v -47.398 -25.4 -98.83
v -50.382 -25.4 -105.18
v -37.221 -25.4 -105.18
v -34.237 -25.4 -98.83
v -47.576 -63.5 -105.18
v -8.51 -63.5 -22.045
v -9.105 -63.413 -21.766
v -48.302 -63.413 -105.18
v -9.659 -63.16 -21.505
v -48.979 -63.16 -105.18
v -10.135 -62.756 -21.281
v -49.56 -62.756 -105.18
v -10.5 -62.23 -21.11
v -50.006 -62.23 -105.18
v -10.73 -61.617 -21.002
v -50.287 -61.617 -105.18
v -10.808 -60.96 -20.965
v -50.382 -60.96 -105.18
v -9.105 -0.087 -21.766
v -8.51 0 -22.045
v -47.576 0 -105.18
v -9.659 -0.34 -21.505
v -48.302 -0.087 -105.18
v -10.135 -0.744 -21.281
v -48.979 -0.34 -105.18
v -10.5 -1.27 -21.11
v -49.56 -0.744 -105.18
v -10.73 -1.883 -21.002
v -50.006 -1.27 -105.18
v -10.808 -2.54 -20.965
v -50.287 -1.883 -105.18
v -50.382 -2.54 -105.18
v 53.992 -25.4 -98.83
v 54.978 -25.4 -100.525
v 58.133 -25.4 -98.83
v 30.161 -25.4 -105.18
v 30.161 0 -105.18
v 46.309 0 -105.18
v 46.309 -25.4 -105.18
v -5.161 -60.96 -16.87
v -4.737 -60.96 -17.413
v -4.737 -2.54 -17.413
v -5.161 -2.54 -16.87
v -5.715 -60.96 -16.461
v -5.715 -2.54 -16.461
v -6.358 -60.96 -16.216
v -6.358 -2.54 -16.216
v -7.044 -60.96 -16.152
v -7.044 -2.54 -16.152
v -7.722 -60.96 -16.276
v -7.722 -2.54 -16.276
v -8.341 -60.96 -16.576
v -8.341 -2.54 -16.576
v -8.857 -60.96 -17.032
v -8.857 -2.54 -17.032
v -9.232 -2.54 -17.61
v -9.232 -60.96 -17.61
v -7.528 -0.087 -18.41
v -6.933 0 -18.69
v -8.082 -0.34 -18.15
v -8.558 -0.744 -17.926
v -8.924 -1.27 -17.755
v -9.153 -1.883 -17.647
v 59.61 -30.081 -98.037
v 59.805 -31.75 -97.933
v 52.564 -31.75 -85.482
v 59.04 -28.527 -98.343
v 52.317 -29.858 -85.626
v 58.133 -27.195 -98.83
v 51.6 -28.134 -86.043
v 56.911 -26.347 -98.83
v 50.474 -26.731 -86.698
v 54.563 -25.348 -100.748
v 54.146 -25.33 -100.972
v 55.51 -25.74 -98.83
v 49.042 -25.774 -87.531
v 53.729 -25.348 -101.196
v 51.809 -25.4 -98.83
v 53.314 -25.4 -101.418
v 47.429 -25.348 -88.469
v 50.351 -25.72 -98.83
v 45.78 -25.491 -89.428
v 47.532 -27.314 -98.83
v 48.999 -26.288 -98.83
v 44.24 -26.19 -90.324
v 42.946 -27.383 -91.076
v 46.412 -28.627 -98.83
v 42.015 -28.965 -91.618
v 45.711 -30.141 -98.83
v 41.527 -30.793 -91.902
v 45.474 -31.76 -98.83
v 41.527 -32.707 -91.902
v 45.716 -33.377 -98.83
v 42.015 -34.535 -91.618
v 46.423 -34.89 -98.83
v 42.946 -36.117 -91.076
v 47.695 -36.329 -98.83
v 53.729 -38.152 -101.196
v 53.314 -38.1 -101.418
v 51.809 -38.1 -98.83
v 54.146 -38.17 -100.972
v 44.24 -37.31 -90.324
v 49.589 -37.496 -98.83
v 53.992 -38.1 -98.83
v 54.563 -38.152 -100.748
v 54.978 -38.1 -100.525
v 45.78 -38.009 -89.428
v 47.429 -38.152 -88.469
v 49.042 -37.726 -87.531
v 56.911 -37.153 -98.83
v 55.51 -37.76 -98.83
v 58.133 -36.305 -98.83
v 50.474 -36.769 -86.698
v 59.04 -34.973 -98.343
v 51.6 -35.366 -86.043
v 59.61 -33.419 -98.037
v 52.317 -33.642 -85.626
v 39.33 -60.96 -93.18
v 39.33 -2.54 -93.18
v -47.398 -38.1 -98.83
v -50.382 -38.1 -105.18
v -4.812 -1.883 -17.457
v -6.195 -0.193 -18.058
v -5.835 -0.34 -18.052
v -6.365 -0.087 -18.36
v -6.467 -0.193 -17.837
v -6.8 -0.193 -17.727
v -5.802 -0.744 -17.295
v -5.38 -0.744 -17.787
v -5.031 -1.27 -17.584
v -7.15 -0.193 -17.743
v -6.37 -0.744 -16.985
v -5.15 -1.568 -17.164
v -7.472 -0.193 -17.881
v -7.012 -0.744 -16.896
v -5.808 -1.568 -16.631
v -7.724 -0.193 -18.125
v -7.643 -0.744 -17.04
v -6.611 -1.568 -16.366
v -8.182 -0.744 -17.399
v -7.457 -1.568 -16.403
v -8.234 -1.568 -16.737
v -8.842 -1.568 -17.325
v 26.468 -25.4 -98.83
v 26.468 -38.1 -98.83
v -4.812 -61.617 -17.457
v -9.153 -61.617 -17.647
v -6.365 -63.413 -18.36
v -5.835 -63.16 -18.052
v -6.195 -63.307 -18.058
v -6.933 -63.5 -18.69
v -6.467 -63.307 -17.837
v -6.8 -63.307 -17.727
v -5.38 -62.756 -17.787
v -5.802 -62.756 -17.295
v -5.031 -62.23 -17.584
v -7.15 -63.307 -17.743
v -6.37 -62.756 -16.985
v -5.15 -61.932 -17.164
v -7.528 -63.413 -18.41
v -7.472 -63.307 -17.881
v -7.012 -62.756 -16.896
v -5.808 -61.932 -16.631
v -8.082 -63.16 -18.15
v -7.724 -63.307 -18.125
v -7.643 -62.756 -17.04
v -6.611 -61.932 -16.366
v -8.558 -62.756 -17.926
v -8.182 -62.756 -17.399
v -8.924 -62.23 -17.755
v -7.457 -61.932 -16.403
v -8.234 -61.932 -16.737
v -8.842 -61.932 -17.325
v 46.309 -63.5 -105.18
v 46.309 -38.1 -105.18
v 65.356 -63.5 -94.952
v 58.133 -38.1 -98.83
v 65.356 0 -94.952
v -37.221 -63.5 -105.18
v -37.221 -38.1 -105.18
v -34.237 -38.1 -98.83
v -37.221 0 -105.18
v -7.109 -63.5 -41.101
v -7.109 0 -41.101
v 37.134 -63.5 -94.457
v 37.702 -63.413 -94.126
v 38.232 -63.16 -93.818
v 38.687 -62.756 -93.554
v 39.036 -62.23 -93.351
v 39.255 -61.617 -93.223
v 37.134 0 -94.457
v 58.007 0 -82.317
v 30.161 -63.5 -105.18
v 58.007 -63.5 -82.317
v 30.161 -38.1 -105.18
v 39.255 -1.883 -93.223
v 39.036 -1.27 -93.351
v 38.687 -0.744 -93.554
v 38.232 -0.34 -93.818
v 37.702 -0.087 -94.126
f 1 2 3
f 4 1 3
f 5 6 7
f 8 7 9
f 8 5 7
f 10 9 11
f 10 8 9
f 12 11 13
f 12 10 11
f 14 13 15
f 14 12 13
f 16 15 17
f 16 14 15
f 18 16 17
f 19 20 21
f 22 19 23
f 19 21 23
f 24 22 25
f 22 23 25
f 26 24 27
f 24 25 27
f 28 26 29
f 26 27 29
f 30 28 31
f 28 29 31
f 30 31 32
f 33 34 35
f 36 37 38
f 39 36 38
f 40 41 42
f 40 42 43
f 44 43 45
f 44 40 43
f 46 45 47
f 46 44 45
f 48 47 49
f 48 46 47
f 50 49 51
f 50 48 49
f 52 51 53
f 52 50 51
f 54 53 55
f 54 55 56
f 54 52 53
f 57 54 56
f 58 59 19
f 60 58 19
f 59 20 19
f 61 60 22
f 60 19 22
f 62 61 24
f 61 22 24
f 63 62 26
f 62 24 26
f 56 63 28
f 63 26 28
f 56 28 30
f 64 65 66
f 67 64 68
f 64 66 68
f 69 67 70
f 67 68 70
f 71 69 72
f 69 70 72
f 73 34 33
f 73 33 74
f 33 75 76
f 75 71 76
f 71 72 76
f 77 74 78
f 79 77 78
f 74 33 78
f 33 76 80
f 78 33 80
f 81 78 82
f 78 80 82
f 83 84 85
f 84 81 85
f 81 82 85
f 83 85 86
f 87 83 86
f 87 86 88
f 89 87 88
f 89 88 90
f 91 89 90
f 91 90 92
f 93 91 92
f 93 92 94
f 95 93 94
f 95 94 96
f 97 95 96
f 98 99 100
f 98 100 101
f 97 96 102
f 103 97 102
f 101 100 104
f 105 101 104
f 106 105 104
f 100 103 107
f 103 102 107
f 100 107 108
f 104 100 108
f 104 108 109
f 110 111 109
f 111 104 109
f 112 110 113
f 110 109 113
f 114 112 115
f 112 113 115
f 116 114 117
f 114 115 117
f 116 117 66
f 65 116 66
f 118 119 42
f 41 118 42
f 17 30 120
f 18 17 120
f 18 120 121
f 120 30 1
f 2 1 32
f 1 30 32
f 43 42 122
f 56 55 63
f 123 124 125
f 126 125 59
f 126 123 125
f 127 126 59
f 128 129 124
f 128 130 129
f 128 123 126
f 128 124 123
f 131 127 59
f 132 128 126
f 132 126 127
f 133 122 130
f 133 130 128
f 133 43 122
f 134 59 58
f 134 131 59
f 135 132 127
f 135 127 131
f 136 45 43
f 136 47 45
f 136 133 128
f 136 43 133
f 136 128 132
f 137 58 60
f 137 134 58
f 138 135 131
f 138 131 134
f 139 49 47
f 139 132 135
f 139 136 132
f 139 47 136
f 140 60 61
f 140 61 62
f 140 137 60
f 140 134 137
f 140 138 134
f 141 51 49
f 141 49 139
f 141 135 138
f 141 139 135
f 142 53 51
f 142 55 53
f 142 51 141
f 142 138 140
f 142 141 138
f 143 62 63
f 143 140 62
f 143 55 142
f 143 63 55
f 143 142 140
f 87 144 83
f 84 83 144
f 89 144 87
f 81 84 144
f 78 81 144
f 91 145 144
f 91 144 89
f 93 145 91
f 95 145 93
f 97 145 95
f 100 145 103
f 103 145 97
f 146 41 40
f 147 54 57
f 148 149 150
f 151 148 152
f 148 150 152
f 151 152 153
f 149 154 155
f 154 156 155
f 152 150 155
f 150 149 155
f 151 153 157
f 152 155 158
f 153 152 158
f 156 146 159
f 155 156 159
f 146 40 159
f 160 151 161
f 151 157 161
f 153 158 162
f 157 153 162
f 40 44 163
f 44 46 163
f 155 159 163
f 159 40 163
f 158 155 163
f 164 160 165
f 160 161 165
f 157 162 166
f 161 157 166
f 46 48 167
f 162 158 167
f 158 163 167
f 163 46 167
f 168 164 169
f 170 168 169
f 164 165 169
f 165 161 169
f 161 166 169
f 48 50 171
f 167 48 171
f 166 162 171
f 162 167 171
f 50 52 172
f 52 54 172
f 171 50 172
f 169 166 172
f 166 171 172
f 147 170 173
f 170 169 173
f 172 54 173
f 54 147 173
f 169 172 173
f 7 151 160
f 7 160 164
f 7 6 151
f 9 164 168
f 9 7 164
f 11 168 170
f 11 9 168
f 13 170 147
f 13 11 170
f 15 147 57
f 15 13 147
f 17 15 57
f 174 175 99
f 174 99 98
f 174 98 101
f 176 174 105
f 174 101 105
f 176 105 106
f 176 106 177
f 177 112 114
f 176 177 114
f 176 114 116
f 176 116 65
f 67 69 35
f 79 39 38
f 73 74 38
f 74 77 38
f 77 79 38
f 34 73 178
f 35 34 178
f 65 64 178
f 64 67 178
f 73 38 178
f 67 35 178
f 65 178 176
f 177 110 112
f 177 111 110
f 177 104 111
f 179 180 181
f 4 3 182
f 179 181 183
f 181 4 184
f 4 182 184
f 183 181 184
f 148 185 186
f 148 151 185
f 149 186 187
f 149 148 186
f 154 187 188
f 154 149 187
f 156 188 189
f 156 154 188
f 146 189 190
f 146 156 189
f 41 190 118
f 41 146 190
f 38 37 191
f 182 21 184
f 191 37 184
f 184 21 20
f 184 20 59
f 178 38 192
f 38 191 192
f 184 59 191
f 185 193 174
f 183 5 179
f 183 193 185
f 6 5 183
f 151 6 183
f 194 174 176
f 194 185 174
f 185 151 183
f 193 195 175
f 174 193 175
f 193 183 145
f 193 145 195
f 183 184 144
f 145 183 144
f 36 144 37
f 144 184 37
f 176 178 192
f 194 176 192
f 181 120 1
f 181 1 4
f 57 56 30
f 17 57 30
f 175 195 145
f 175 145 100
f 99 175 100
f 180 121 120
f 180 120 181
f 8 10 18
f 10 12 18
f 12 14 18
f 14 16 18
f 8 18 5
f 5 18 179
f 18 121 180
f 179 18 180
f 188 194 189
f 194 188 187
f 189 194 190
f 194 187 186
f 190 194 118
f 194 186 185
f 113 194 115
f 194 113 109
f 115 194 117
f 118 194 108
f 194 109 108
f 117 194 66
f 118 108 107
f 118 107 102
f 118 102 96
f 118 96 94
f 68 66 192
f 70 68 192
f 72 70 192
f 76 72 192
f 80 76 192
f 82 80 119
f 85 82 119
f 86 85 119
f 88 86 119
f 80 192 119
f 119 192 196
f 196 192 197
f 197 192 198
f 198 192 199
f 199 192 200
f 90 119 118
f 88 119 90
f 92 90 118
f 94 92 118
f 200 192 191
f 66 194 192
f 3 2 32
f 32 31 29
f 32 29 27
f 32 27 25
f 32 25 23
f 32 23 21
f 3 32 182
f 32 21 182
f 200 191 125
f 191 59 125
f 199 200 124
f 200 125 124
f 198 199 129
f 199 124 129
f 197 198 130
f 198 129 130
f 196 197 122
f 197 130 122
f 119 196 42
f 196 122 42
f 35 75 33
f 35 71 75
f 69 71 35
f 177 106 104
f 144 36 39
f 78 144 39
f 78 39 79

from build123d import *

# Parameters (mm, degrees)
F1_DEPTH = 63.5
F2_R     = 6.4197594032
F3_DEPTH = 23.4593788755
F4_W     = 124.8833438046
F4_H     = 12.7
F5_DEPTH = 6.35
F6_R     = 2.54


with BuildPart() as f1:
    # F0 (on Front) → F1 (new body)
    with BuildSketch(Plane.XZ):
        Polygon((58.006938024, -82.3166997439), (39.3296977039, -93.179662284), (-7.1721252495, -13.2267286881), (-10.8084349941, -20.9649698821), (-50.382357985, -105.180172272), (-37.2205925623, -105.180172272), (-7.1087183348, -41.1006625658), (30.1608836833, -105.180172272), (46.3093739423, -105.180172272), (65.3555968279, -94.9516200987), align=None)
    extrude(amount=F1_DEPTH)

    # F2 (on face) → F3 (cut, through all)
    with BuildSketch(Plane(origin=(50.4372636726, 0, -86.7193356531), x_dir=(0.8644246839, 0, 0.5027623353), z_dir=(-0.5027623353, 0, 0.8644246839))):
        with Locations((-3.9596631056, -31.75)):
            Circle(F2_R)
    extrude(amount=-F3_DEPTH, mode=Mode.SUBTRACT)

    # F4 (on face) → F5 (cut)
    with BuildSketch(Plane(origin=(0, 0, -105.180172272), x_dir=(1, 0, 0), z_dir=(0, 0, -1))):
        with Locations((11.0299456865, 31.75)):
            Rectangle(F4_W, F4_H)
    extrude(amount=-F5_DEPTH, mode=Mode.SUBTRACT)

    # F6
    f6_edges = [f1.edges().sort_by_distance(p)[0] for p in [
        (-7.172125, -31.75, -13.226729),
        (16.078786, -63.5, -53.203195),
        (16.078786, 0, -53.203195),
        (-28.777242, -63.5, -59.20345),
        (-28.777242, 0, -59.20345),
    ]]
    fillet(f6_edges, radius=F6_R)


solid = f1.part
